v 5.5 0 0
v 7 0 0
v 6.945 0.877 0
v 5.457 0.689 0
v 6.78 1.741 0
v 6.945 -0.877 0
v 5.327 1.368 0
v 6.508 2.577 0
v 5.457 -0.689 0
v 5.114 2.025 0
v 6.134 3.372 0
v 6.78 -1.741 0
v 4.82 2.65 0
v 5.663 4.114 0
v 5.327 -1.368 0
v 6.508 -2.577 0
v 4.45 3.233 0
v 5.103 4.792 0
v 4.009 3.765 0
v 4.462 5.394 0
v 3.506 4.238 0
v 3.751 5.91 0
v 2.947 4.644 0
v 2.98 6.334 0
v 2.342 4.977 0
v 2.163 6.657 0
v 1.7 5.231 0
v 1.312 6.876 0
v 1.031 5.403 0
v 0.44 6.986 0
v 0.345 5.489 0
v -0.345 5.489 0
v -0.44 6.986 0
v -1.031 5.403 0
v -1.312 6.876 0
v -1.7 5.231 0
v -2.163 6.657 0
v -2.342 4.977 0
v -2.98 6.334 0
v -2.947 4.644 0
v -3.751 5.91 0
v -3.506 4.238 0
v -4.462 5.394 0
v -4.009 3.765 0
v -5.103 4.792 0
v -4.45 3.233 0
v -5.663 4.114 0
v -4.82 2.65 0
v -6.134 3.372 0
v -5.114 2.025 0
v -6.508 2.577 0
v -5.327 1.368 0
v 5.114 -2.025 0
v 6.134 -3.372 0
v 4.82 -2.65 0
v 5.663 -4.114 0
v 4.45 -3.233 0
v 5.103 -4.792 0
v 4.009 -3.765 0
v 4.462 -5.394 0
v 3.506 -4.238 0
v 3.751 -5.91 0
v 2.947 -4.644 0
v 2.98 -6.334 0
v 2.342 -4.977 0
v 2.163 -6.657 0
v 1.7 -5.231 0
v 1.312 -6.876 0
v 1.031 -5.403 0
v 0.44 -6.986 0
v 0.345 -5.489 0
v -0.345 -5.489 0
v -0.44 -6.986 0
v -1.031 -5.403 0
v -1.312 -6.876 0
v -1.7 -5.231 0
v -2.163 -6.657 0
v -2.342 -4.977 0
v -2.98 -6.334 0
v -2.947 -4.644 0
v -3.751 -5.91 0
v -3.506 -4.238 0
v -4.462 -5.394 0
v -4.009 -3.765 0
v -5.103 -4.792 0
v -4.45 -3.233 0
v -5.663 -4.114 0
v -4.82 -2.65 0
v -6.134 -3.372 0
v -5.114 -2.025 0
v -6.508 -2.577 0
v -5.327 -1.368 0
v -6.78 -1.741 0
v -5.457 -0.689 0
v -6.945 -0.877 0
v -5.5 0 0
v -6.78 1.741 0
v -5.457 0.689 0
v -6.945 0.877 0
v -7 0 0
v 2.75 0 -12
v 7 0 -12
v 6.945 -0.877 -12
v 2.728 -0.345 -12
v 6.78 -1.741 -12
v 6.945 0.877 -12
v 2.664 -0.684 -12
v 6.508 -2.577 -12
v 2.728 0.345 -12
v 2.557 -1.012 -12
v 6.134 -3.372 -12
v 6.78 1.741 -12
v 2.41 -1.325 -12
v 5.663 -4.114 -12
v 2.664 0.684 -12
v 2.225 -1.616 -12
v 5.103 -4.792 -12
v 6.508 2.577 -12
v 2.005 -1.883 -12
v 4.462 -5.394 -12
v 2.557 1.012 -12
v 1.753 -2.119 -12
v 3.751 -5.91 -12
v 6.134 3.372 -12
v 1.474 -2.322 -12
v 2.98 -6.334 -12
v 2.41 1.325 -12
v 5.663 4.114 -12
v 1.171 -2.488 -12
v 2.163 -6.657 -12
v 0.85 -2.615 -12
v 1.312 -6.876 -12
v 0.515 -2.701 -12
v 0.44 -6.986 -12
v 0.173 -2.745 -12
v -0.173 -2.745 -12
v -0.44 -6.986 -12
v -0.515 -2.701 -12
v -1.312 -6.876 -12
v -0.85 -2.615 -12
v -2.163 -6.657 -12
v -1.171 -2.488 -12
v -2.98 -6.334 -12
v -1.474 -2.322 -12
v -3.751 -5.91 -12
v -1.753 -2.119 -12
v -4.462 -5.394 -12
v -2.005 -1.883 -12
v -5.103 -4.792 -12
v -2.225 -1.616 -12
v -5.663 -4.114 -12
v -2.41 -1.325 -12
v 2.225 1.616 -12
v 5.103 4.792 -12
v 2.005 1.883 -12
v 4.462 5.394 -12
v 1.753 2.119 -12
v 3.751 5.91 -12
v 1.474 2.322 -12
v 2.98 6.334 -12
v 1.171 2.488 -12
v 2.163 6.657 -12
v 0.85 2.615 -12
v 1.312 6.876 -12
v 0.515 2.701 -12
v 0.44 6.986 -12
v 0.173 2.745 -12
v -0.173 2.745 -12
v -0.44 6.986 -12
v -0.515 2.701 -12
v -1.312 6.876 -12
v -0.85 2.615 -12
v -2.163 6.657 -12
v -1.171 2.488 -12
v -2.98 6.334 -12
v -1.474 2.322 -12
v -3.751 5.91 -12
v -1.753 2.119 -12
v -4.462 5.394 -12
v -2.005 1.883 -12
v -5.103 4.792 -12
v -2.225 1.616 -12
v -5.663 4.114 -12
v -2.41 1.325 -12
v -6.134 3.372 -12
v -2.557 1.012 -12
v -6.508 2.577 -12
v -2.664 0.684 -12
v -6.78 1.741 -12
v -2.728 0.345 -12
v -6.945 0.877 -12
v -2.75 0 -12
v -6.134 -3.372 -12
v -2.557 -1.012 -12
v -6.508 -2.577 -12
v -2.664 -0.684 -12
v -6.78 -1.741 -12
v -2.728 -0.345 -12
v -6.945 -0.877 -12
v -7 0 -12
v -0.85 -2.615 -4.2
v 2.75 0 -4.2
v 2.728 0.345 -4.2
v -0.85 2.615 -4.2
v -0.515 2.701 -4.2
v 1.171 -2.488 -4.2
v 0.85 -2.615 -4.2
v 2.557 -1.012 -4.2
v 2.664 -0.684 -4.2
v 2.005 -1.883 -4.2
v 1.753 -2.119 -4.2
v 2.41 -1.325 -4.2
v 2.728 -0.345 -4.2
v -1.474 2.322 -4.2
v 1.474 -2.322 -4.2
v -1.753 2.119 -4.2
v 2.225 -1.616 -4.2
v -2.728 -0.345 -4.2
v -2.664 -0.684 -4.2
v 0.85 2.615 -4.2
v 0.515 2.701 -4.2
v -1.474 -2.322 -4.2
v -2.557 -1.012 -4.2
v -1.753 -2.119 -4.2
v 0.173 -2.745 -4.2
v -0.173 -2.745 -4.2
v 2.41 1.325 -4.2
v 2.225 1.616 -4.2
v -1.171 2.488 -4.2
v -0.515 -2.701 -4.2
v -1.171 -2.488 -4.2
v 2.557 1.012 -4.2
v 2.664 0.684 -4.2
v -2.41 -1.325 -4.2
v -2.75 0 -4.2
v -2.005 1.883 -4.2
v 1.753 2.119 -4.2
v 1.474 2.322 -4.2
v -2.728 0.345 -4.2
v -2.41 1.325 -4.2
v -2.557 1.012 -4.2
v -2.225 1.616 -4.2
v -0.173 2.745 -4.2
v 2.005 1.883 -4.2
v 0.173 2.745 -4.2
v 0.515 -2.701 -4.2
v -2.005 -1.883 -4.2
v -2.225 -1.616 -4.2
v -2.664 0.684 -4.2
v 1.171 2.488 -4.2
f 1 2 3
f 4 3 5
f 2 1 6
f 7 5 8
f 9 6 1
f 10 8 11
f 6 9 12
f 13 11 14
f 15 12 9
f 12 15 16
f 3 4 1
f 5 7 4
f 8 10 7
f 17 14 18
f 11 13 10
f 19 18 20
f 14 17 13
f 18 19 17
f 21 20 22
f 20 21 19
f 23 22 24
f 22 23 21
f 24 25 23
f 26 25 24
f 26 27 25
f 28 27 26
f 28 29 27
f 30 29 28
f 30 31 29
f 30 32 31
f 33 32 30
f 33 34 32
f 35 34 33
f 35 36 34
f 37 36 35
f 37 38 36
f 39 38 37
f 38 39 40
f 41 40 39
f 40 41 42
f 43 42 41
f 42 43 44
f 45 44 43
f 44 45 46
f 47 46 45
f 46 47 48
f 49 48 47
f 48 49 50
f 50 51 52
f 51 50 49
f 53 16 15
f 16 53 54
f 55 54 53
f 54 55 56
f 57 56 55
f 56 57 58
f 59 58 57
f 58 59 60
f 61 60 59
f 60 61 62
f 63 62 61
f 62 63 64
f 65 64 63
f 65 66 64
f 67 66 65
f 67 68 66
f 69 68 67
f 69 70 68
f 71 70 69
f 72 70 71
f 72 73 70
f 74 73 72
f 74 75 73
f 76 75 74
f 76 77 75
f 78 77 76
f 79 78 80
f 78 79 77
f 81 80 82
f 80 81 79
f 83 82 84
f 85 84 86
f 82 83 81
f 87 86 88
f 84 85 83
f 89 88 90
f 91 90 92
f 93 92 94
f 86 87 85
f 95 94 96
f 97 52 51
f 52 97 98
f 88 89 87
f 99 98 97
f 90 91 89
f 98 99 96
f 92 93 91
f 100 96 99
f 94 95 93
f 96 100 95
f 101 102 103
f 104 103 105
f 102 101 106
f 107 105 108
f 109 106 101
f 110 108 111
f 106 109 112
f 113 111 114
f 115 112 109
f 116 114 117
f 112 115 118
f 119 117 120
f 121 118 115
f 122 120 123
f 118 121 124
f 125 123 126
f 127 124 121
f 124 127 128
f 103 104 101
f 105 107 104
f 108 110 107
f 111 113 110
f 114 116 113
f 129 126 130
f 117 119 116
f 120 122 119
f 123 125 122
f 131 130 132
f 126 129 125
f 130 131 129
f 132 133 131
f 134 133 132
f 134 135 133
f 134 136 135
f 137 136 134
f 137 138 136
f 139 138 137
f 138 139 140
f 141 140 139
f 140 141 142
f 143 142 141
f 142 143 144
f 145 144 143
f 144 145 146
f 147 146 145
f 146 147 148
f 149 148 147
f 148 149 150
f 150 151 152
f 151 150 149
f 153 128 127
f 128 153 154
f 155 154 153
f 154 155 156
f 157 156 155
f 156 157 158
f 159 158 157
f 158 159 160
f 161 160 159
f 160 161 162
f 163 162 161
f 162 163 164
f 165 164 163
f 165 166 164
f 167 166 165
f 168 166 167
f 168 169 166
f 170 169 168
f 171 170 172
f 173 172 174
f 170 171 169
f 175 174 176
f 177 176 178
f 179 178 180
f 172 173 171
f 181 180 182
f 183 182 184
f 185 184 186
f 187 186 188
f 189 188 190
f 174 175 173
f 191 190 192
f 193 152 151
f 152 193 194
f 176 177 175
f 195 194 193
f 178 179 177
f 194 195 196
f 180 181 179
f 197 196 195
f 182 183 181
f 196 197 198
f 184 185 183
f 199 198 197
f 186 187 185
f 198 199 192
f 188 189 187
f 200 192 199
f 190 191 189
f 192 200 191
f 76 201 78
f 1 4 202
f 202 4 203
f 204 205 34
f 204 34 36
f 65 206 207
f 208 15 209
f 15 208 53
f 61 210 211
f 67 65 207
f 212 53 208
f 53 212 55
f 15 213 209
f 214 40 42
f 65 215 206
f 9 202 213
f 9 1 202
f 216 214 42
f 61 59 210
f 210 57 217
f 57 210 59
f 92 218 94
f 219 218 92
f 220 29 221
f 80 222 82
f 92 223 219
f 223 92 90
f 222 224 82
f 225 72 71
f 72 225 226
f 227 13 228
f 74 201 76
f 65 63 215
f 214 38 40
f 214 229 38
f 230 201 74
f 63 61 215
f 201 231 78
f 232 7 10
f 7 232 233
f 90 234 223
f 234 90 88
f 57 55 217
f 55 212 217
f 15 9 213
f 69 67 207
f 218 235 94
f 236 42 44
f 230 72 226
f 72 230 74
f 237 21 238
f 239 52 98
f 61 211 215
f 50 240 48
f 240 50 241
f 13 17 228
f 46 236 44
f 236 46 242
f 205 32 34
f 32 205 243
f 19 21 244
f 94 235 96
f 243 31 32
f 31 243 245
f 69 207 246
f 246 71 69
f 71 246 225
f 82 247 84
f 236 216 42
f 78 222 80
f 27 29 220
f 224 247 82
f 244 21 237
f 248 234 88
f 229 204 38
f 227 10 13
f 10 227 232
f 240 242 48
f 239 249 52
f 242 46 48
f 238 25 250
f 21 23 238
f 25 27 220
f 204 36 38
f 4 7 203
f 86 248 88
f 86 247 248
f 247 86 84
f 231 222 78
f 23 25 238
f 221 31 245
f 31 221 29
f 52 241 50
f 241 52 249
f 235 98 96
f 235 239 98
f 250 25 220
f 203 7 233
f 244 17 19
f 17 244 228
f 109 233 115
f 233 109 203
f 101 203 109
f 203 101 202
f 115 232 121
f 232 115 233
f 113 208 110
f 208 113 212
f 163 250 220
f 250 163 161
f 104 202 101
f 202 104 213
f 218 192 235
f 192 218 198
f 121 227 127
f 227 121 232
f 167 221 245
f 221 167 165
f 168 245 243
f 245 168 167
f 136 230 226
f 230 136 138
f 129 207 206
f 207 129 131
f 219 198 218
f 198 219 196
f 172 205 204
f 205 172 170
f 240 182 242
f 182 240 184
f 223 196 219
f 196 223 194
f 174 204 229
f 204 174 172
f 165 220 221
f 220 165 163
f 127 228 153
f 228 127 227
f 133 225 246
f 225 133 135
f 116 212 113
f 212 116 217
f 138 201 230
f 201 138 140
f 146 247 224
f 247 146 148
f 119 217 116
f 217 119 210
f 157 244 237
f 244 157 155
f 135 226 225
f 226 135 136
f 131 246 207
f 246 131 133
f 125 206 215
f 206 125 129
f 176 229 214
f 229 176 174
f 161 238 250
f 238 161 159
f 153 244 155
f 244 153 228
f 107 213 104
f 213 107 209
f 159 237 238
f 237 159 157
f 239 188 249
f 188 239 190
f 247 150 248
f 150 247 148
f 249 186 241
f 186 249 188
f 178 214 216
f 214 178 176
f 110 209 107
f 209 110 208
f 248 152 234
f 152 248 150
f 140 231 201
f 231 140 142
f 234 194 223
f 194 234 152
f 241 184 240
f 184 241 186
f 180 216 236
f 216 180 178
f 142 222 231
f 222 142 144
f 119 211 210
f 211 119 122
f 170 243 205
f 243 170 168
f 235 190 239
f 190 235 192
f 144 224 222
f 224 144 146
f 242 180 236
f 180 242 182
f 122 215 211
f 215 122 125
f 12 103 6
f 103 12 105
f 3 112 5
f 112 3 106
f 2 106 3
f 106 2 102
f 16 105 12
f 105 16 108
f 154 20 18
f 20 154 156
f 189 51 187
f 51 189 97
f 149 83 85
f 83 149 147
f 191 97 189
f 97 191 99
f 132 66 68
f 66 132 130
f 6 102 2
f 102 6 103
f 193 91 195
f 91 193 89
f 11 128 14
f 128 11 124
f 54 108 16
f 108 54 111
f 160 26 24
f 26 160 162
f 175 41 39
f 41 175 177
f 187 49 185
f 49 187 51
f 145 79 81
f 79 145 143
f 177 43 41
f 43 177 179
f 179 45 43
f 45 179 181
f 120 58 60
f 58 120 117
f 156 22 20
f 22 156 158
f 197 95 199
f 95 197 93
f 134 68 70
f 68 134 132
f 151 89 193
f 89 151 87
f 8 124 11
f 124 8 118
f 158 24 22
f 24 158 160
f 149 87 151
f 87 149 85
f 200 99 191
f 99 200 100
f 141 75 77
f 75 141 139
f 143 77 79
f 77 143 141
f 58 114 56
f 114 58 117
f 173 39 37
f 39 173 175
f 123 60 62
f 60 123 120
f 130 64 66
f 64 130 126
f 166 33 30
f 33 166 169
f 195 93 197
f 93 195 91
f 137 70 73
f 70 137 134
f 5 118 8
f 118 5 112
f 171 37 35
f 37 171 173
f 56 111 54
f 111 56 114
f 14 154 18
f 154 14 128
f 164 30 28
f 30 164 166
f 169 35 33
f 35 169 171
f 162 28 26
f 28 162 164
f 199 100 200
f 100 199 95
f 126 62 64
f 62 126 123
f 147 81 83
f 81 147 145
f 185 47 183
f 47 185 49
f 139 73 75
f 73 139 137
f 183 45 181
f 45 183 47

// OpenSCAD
$fn = 50;


difference() {
	union() {
		translate(v = [0, 0, -12.0000000000]) {
			cylinder(h = 12, r = 7.0000000000);
		}
	}
	union() {
		translate(v = [0, 0, 0]) {
			rotate(a = [0, 0, 0]) {
				difference() {
					union() {
						translate(v = [0, 0, -12.0000000000]) {
							cylinder(h = 12, r = 2.2500000000);
						}
						translate(v = [0, 0, -4.2000000000]) {
							cylinder(h = 4.2000000000, r1 = 2.7500000000, r2 = 5.5000000000);
						}
						translate(v = [0, 0, -12.0000000000]) {
							cylinder(h = 12, r = 2.7500000000);
						}
						translate(v = [0, 0, -12.0000000000]) {
							cylinder(h = 12, r = 2.2500000000);
						}
					}
					union();
				}
			}
		}
	}
}
